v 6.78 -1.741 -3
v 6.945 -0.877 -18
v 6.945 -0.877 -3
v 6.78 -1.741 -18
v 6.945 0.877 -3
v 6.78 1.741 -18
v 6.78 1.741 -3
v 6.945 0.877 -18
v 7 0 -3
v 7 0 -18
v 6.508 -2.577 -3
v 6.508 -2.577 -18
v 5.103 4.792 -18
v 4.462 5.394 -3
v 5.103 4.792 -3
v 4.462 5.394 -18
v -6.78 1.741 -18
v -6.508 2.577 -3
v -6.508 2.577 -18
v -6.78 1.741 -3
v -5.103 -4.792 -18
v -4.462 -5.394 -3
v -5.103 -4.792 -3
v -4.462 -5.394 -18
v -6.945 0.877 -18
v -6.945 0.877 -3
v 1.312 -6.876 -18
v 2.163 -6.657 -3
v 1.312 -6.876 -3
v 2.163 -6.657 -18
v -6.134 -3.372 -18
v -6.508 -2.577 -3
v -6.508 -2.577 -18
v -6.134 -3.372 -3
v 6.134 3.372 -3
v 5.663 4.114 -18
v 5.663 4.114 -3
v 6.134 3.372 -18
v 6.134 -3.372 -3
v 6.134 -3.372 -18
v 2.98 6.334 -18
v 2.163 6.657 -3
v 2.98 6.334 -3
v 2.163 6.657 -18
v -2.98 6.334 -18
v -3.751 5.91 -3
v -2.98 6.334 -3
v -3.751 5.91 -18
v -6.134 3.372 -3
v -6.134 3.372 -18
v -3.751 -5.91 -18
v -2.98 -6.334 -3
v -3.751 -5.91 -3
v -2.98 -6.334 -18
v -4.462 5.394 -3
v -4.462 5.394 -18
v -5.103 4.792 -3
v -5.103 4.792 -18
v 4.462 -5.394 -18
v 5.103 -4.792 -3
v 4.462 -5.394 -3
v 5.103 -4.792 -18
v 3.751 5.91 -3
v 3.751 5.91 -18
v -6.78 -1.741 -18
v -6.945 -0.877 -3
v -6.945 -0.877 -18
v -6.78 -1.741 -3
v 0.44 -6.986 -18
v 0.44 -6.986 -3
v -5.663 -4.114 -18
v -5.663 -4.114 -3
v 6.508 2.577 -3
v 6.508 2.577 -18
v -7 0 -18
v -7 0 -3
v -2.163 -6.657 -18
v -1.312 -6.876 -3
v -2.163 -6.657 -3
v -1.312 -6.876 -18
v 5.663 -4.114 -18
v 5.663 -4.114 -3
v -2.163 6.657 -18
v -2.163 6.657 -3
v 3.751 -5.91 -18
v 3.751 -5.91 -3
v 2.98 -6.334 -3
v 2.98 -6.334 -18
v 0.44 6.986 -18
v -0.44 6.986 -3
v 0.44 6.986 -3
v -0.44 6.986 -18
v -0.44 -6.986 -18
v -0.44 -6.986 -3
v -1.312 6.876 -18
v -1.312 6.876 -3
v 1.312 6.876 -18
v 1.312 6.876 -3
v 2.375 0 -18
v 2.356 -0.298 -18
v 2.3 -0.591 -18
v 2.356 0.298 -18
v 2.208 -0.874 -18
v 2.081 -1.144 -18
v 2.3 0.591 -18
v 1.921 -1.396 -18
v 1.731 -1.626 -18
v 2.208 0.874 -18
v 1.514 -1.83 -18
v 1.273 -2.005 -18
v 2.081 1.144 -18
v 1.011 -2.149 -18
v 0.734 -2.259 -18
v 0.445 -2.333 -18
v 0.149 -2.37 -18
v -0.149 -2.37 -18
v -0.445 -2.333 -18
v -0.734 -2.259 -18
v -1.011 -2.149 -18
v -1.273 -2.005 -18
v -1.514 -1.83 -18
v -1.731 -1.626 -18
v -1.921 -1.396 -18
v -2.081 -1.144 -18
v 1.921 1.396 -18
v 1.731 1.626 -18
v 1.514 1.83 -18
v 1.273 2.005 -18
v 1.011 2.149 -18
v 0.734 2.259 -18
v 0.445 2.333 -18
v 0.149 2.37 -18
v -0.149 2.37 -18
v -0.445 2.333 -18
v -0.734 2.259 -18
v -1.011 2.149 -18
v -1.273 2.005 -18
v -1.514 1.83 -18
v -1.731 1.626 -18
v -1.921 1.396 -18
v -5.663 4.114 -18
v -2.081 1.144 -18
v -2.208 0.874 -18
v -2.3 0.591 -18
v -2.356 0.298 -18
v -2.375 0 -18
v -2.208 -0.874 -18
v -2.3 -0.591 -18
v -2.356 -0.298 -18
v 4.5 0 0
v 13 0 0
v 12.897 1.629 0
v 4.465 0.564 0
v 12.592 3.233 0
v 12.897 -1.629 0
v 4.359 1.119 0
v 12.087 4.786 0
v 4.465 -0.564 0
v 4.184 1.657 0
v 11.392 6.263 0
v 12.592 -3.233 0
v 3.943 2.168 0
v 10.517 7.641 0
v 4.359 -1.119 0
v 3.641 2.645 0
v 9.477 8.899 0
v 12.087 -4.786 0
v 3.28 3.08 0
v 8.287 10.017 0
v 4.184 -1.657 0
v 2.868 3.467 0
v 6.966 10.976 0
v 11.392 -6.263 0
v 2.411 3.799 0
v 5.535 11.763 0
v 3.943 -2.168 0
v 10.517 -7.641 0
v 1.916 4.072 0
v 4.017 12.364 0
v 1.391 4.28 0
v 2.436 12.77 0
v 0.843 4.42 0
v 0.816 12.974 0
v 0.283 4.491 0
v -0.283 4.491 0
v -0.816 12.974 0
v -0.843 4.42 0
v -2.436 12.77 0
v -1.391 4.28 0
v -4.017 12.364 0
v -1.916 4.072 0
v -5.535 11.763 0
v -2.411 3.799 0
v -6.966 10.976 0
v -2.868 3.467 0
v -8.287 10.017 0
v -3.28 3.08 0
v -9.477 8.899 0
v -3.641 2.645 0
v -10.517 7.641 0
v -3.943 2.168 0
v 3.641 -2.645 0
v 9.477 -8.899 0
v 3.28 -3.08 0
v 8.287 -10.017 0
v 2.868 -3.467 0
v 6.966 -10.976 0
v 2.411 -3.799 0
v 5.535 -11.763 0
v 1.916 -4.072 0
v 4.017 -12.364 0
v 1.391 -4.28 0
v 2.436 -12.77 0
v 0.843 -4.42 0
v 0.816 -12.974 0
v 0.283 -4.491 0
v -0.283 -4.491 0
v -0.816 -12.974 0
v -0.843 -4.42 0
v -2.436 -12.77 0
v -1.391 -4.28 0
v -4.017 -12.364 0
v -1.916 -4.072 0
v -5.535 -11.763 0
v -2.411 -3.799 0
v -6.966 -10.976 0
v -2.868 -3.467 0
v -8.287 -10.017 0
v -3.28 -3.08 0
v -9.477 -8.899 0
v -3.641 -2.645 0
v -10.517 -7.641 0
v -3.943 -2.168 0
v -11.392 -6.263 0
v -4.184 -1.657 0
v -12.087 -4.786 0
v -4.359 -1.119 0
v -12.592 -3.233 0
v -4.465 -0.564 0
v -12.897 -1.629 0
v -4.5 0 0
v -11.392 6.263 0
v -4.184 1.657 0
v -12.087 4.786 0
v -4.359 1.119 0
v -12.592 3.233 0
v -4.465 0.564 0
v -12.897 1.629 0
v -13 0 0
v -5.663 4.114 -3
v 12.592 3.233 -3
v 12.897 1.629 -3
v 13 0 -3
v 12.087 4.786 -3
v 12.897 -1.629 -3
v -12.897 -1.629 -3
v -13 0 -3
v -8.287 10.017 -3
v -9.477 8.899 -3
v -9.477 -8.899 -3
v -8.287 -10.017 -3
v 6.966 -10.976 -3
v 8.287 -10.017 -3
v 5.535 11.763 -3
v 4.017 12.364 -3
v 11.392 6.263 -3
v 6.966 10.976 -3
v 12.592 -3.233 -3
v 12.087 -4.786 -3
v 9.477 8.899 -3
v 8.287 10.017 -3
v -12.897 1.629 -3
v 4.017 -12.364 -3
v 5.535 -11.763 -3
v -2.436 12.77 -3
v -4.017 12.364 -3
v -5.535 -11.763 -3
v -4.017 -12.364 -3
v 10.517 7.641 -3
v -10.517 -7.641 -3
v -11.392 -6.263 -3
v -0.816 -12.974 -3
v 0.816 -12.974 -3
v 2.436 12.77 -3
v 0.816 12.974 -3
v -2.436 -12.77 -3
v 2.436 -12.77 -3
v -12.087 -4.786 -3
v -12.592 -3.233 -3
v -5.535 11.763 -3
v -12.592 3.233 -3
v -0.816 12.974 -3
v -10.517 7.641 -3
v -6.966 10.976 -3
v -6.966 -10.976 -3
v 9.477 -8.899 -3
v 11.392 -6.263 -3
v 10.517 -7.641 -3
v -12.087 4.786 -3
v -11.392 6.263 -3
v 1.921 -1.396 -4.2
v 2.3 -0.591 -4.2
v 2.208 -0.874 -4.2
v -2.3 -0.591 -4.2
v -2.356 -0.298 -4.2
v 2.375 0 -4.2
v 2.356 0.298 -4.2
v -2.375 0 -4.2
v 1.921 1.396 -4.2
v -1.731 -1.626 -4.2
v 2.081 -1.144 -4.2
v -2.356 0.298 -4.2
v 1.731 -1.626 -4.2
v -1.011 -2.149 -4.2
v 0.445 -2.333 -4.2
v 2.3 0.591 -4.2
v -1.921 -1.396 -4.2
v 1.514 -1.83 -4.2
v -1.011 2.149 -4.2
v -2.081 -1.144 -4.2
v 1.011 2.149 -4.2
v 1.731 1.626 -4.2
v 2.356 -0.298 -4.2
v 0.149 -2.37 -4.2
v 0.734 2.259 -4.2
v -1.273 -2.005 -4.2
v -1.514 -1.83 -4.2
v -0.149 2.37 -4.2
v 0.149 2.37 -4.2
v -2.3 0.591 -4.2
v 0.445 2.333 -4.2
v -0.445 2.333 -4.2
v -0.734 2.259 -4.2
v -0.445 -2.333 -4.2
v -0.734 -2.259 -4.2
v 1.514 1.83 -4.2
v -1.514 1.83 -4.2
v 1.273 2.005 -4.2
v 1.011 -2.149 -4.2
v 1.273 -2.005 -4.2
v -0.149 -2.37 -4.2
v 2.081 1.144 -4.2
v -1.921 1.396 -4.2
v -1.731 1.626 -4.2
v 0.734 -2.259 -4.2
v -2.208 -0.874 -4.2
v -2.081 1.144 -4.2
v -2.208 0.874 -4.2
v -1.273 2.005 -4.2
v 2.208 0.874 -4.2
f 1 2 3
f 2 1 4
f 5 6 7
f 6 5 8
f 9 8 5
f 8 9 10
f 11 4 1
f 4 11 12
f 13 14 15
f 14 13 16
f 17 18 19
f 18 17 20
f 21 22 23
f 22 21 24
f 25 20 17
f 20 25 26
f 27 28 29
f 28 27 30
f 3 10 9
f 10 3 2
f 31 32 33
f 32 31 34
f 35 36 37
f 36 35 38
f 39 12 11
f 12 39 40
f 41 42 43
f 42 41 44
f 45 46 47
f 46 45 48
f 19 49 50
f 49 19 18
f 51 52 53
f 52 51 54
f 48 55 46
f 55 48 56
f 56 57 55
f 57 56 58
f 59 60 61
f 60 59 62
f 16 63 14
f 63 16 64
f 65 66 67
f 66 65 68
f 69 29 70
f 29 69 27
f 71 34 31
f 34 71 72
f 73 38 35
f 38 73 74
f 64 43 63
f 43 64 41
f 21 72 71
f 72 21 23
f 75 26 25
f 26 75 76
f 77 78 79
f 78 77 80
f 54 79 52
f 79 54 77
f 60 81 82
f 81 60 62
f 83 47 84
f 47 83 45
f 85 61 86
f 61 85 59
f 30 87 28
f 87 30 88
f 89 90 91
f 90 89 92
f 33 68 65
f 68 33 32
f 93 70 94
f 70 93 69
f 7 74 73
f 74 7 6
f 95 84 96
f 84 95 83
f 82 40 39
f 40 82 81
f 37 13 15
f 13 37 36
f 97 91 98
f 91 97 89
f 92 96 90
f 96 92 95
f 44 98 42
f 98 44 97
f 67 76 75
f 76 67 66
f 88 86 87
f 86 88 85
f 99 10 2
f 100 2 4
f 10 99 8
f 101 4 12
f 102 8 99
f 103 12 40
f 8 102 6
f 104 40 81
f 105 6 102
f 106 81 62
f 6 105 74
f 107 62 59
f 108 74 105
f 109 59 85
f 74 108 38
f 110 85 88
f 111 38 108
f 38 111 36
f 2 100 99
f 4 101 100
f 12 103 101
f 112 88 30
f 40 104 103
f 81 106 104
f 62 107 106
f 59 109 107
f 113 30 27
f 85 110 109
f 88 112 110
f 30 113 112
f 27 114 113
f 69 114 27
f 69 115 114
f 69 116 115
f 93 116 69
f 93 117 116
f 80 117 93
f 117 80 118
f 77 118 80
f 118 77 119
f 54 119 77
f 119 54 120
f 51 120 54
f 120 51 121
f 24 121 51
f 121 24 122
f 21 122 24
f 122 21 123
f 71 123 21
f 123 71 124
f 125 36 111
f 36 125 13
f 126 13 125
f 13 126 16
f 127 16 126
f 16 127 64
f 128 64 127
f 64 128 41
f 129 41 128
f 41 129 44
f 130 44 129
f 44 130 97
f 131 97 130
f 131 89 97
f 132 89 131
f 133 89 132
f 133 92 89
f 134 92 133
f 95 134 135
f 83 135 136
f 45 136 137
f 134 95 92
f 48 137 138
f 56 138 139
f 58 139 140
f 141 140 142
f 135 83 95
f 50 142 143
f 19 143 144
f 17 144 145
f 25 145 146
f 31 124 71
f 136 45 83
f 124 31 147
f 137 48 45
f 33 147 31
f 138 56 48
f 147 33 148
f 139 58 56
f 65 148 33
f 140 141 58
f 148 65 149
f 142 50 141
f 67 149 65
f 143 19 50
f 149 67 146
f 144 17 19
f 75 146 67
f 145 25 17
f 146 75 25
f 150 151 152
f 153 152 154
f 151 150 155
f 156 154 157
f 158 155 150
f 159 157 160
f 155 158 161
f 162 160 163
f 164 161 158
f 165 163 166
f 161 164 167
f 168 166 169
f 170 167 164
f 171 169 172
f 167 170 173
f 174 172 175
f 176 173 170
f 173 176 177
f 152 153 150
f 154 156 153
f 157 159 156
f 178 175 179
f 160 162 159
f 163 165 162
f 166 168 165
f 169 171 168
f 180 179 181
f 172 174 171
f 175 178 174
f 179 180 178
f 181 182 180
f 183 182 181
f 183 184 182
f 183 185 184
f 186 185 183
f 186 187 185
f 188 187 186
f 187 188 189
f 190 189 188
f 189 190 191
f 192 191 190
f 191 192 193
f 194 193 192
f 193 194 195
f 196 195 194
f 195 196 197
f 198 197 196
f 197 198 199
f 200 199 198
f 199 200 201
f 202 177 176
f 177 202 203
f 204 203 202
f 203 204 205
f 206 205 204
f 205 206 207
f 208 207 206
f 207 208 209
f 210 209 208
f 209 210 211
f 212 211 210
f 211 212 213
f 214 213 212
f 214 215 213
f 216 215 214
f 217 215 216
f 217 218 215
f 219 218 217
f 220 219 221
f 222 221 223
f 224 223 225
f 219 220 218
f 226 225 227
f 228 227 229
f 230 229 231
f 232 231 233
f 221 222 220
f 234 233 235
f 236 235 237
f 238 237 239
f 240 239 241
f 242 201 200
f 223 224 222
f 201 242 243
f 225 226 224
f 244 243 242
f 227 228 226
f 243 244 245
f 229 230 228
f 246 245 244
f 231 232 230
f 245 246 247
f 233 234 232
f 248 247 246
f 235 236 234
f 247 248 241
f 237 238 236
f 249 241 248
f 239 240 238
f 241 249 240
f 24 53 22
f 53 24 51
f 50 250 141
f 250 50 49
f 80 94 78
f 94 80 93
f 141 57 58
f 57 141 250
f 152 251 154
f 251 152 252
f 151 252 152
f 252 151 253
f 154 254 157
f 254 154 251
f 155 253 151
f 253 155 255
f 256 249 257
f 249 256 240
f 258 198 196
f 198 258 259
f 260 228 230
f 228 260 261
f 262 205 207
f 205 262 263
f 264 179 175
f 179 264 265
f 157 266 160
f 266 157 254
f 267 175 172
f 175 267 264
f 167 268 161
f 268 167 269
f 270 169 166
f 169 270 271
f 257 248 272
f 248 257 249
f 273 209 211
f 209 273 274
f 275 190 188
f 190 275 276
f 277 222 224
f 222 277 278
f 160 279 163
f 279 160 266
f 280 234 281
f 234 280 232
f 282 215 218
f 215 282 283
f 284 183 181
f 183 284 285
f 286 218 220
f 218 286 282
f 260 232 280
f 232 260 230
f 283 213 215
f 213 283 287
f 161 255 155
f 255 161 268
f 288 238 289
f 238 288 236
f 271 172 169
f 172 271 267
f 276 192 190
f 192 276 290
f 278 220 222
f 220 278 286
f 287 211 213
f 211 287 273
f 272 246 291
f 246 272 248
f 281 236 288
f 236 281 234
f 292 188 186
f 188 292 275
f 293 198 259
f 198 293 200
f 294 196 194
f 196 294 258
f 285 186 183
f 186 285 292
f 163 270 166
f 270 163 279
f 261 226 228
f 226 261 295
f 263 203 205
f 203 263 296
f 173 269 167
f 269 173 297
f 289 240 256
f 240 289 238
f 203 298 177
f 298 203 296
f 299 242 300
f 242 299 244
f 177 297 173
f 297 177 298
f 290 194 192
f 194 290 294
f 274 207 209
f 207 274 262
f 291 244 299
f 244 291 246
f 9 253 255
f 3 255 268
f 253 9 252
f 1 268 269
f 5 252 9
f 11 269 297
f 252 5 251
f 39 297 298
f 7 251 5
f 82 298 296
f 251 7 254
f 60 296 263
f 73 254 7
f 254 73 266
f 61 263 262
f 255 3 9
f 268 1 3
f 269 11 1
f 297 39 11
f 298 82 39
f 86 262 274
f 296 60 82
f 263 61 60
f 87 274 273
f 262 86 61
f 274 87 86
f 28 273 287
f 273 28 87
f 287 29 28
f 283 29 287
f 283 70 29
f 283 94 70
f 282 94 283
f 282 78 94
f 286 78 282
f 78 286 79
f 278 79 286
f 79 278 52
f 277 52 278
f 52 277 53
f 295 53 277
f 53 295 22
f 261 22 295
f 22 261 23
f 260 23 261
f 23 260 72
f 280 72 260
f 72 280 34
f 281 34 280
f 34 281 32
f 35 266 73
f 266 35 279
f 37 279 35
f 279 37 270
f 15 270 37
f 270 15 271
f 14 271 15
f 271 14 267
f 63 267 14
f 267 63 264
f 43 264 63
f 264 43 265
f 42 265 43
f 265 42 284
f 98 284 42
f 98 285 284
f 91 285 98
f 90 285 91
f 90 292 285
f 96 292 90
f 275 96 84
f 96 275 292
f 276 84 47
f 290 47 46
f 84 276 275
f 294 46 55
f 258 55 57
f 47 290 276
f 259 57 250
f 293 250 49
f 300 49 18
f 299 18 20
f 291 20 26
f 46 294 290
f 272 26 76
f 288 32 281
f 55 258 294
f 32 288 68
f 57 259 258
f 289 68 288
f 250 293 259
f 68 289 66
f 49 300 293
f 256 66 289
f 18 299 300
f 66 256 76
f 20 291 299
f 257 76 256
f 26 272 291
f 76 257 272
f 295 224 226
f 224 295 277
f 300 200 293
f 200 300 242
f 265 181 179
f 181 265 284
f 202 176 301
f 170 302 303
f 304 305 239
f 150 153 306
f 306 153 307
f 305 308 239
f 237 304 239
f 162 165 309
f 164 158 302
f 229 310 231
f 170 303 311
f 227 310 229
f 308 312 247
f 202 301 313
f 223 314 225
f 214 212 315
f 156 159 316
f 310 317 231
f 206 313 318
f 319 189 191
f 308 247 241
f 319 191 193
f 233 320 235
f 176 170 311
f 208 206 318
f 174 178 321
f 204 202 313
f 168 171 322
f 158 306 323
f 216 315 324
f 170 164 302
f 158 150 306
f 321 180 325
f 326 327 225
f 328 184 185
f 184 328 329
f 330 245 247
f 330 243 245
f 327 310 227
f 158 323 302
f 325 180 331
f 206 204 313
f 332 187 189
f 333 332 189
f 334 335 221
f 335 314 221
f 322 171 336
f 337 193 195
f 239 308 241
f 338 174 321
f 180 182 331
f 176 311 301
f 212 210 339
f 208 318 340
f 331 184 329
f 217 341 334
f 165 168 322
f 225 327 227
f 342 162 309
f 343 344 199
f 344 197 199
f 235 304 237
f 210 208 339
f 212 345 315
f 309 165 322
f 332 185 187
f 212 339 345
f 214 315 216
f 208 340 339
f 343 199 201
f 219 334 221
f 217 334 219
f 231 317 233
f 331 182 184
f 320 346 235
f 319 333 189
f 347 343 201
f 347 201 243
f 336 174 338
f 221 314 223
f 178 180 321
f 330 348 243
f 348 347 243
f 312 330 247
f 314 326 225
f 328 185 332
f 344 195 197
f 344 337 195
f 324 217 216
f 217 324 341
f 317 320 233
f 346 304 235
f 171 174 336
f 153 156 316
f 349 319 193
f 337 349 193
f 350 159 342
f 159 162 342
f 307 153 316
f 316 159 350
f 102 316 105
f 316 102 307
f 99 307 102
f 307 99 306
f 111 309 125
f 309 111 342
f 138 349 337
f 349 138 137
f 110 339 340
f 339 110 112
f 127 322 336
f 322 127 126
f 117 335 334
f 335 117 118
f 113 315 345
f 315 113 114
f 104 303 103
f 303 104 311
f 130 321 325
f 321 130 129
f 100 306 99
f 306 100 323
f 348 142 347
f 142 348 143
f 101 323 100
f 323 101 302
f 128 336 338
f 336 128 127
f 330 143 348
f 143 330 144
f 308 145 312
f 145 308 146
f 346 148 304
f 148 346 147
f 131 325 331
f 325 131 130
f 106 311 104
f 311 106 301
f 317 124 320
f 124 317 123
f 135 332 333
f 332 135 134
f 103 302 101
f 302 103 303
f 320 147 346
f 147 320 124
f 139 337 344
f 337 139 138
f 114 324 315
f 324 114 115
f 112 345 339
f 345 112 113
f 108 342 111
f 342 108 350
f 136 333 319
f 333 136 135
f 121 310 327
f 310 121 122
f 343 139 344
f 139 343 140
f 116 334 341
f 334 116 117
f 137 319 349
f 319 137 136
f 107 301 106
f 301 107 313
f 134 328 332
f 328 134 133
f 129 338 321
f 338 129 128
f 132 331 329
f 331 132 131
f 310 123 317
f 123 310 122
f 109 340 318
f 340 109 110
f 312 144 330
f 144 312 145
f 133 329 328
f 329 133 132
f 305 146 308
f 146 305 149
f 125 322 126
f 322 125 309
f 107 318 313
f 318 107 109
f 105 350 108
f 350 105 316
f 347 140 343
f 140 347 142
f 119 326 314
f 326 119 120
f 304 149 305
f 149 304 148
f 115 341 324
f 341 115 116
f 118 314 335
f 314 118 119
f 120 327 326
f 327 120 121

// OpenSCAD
$fn = 50;


difference() {
	union() {
		translate(v = [0, 0, -18.0000000000]) {
			cylinder(h = 18, r = 7.0000000000);
		}
		translate(v = [0, 0, -3.0000000000]) {
			cylinder(h = 3, r = 13.0000000000);
		}
	}
	union() {
		translate(v = [0, 0, 0]) {
			rotate(a = [0, 0, 0]) {
				difference() {
					union() {
						#translate(v = [0, 0, -18.0000000000]) {
							cylinder(h = 18, r = 2.2500000000);
						}
						#translate(v = [0, 0, -4.2000000000]) {
							cylinder(h = 4.2000000000, r = 7.0000000000, r1 = 2.3750000000, r2 = 4.5000000000);
						}
						#translate(v = [0, 0, -18.0000000000]) {
							cylinder(h = 18, r = 2.3750000000);
						}
						#translate(v = [0, 0, -18.0000000000]) {
							cylinder(h = 18, r = 2.2500000000);
						}
					}
					union();
				}
			}
		}
	}
}
